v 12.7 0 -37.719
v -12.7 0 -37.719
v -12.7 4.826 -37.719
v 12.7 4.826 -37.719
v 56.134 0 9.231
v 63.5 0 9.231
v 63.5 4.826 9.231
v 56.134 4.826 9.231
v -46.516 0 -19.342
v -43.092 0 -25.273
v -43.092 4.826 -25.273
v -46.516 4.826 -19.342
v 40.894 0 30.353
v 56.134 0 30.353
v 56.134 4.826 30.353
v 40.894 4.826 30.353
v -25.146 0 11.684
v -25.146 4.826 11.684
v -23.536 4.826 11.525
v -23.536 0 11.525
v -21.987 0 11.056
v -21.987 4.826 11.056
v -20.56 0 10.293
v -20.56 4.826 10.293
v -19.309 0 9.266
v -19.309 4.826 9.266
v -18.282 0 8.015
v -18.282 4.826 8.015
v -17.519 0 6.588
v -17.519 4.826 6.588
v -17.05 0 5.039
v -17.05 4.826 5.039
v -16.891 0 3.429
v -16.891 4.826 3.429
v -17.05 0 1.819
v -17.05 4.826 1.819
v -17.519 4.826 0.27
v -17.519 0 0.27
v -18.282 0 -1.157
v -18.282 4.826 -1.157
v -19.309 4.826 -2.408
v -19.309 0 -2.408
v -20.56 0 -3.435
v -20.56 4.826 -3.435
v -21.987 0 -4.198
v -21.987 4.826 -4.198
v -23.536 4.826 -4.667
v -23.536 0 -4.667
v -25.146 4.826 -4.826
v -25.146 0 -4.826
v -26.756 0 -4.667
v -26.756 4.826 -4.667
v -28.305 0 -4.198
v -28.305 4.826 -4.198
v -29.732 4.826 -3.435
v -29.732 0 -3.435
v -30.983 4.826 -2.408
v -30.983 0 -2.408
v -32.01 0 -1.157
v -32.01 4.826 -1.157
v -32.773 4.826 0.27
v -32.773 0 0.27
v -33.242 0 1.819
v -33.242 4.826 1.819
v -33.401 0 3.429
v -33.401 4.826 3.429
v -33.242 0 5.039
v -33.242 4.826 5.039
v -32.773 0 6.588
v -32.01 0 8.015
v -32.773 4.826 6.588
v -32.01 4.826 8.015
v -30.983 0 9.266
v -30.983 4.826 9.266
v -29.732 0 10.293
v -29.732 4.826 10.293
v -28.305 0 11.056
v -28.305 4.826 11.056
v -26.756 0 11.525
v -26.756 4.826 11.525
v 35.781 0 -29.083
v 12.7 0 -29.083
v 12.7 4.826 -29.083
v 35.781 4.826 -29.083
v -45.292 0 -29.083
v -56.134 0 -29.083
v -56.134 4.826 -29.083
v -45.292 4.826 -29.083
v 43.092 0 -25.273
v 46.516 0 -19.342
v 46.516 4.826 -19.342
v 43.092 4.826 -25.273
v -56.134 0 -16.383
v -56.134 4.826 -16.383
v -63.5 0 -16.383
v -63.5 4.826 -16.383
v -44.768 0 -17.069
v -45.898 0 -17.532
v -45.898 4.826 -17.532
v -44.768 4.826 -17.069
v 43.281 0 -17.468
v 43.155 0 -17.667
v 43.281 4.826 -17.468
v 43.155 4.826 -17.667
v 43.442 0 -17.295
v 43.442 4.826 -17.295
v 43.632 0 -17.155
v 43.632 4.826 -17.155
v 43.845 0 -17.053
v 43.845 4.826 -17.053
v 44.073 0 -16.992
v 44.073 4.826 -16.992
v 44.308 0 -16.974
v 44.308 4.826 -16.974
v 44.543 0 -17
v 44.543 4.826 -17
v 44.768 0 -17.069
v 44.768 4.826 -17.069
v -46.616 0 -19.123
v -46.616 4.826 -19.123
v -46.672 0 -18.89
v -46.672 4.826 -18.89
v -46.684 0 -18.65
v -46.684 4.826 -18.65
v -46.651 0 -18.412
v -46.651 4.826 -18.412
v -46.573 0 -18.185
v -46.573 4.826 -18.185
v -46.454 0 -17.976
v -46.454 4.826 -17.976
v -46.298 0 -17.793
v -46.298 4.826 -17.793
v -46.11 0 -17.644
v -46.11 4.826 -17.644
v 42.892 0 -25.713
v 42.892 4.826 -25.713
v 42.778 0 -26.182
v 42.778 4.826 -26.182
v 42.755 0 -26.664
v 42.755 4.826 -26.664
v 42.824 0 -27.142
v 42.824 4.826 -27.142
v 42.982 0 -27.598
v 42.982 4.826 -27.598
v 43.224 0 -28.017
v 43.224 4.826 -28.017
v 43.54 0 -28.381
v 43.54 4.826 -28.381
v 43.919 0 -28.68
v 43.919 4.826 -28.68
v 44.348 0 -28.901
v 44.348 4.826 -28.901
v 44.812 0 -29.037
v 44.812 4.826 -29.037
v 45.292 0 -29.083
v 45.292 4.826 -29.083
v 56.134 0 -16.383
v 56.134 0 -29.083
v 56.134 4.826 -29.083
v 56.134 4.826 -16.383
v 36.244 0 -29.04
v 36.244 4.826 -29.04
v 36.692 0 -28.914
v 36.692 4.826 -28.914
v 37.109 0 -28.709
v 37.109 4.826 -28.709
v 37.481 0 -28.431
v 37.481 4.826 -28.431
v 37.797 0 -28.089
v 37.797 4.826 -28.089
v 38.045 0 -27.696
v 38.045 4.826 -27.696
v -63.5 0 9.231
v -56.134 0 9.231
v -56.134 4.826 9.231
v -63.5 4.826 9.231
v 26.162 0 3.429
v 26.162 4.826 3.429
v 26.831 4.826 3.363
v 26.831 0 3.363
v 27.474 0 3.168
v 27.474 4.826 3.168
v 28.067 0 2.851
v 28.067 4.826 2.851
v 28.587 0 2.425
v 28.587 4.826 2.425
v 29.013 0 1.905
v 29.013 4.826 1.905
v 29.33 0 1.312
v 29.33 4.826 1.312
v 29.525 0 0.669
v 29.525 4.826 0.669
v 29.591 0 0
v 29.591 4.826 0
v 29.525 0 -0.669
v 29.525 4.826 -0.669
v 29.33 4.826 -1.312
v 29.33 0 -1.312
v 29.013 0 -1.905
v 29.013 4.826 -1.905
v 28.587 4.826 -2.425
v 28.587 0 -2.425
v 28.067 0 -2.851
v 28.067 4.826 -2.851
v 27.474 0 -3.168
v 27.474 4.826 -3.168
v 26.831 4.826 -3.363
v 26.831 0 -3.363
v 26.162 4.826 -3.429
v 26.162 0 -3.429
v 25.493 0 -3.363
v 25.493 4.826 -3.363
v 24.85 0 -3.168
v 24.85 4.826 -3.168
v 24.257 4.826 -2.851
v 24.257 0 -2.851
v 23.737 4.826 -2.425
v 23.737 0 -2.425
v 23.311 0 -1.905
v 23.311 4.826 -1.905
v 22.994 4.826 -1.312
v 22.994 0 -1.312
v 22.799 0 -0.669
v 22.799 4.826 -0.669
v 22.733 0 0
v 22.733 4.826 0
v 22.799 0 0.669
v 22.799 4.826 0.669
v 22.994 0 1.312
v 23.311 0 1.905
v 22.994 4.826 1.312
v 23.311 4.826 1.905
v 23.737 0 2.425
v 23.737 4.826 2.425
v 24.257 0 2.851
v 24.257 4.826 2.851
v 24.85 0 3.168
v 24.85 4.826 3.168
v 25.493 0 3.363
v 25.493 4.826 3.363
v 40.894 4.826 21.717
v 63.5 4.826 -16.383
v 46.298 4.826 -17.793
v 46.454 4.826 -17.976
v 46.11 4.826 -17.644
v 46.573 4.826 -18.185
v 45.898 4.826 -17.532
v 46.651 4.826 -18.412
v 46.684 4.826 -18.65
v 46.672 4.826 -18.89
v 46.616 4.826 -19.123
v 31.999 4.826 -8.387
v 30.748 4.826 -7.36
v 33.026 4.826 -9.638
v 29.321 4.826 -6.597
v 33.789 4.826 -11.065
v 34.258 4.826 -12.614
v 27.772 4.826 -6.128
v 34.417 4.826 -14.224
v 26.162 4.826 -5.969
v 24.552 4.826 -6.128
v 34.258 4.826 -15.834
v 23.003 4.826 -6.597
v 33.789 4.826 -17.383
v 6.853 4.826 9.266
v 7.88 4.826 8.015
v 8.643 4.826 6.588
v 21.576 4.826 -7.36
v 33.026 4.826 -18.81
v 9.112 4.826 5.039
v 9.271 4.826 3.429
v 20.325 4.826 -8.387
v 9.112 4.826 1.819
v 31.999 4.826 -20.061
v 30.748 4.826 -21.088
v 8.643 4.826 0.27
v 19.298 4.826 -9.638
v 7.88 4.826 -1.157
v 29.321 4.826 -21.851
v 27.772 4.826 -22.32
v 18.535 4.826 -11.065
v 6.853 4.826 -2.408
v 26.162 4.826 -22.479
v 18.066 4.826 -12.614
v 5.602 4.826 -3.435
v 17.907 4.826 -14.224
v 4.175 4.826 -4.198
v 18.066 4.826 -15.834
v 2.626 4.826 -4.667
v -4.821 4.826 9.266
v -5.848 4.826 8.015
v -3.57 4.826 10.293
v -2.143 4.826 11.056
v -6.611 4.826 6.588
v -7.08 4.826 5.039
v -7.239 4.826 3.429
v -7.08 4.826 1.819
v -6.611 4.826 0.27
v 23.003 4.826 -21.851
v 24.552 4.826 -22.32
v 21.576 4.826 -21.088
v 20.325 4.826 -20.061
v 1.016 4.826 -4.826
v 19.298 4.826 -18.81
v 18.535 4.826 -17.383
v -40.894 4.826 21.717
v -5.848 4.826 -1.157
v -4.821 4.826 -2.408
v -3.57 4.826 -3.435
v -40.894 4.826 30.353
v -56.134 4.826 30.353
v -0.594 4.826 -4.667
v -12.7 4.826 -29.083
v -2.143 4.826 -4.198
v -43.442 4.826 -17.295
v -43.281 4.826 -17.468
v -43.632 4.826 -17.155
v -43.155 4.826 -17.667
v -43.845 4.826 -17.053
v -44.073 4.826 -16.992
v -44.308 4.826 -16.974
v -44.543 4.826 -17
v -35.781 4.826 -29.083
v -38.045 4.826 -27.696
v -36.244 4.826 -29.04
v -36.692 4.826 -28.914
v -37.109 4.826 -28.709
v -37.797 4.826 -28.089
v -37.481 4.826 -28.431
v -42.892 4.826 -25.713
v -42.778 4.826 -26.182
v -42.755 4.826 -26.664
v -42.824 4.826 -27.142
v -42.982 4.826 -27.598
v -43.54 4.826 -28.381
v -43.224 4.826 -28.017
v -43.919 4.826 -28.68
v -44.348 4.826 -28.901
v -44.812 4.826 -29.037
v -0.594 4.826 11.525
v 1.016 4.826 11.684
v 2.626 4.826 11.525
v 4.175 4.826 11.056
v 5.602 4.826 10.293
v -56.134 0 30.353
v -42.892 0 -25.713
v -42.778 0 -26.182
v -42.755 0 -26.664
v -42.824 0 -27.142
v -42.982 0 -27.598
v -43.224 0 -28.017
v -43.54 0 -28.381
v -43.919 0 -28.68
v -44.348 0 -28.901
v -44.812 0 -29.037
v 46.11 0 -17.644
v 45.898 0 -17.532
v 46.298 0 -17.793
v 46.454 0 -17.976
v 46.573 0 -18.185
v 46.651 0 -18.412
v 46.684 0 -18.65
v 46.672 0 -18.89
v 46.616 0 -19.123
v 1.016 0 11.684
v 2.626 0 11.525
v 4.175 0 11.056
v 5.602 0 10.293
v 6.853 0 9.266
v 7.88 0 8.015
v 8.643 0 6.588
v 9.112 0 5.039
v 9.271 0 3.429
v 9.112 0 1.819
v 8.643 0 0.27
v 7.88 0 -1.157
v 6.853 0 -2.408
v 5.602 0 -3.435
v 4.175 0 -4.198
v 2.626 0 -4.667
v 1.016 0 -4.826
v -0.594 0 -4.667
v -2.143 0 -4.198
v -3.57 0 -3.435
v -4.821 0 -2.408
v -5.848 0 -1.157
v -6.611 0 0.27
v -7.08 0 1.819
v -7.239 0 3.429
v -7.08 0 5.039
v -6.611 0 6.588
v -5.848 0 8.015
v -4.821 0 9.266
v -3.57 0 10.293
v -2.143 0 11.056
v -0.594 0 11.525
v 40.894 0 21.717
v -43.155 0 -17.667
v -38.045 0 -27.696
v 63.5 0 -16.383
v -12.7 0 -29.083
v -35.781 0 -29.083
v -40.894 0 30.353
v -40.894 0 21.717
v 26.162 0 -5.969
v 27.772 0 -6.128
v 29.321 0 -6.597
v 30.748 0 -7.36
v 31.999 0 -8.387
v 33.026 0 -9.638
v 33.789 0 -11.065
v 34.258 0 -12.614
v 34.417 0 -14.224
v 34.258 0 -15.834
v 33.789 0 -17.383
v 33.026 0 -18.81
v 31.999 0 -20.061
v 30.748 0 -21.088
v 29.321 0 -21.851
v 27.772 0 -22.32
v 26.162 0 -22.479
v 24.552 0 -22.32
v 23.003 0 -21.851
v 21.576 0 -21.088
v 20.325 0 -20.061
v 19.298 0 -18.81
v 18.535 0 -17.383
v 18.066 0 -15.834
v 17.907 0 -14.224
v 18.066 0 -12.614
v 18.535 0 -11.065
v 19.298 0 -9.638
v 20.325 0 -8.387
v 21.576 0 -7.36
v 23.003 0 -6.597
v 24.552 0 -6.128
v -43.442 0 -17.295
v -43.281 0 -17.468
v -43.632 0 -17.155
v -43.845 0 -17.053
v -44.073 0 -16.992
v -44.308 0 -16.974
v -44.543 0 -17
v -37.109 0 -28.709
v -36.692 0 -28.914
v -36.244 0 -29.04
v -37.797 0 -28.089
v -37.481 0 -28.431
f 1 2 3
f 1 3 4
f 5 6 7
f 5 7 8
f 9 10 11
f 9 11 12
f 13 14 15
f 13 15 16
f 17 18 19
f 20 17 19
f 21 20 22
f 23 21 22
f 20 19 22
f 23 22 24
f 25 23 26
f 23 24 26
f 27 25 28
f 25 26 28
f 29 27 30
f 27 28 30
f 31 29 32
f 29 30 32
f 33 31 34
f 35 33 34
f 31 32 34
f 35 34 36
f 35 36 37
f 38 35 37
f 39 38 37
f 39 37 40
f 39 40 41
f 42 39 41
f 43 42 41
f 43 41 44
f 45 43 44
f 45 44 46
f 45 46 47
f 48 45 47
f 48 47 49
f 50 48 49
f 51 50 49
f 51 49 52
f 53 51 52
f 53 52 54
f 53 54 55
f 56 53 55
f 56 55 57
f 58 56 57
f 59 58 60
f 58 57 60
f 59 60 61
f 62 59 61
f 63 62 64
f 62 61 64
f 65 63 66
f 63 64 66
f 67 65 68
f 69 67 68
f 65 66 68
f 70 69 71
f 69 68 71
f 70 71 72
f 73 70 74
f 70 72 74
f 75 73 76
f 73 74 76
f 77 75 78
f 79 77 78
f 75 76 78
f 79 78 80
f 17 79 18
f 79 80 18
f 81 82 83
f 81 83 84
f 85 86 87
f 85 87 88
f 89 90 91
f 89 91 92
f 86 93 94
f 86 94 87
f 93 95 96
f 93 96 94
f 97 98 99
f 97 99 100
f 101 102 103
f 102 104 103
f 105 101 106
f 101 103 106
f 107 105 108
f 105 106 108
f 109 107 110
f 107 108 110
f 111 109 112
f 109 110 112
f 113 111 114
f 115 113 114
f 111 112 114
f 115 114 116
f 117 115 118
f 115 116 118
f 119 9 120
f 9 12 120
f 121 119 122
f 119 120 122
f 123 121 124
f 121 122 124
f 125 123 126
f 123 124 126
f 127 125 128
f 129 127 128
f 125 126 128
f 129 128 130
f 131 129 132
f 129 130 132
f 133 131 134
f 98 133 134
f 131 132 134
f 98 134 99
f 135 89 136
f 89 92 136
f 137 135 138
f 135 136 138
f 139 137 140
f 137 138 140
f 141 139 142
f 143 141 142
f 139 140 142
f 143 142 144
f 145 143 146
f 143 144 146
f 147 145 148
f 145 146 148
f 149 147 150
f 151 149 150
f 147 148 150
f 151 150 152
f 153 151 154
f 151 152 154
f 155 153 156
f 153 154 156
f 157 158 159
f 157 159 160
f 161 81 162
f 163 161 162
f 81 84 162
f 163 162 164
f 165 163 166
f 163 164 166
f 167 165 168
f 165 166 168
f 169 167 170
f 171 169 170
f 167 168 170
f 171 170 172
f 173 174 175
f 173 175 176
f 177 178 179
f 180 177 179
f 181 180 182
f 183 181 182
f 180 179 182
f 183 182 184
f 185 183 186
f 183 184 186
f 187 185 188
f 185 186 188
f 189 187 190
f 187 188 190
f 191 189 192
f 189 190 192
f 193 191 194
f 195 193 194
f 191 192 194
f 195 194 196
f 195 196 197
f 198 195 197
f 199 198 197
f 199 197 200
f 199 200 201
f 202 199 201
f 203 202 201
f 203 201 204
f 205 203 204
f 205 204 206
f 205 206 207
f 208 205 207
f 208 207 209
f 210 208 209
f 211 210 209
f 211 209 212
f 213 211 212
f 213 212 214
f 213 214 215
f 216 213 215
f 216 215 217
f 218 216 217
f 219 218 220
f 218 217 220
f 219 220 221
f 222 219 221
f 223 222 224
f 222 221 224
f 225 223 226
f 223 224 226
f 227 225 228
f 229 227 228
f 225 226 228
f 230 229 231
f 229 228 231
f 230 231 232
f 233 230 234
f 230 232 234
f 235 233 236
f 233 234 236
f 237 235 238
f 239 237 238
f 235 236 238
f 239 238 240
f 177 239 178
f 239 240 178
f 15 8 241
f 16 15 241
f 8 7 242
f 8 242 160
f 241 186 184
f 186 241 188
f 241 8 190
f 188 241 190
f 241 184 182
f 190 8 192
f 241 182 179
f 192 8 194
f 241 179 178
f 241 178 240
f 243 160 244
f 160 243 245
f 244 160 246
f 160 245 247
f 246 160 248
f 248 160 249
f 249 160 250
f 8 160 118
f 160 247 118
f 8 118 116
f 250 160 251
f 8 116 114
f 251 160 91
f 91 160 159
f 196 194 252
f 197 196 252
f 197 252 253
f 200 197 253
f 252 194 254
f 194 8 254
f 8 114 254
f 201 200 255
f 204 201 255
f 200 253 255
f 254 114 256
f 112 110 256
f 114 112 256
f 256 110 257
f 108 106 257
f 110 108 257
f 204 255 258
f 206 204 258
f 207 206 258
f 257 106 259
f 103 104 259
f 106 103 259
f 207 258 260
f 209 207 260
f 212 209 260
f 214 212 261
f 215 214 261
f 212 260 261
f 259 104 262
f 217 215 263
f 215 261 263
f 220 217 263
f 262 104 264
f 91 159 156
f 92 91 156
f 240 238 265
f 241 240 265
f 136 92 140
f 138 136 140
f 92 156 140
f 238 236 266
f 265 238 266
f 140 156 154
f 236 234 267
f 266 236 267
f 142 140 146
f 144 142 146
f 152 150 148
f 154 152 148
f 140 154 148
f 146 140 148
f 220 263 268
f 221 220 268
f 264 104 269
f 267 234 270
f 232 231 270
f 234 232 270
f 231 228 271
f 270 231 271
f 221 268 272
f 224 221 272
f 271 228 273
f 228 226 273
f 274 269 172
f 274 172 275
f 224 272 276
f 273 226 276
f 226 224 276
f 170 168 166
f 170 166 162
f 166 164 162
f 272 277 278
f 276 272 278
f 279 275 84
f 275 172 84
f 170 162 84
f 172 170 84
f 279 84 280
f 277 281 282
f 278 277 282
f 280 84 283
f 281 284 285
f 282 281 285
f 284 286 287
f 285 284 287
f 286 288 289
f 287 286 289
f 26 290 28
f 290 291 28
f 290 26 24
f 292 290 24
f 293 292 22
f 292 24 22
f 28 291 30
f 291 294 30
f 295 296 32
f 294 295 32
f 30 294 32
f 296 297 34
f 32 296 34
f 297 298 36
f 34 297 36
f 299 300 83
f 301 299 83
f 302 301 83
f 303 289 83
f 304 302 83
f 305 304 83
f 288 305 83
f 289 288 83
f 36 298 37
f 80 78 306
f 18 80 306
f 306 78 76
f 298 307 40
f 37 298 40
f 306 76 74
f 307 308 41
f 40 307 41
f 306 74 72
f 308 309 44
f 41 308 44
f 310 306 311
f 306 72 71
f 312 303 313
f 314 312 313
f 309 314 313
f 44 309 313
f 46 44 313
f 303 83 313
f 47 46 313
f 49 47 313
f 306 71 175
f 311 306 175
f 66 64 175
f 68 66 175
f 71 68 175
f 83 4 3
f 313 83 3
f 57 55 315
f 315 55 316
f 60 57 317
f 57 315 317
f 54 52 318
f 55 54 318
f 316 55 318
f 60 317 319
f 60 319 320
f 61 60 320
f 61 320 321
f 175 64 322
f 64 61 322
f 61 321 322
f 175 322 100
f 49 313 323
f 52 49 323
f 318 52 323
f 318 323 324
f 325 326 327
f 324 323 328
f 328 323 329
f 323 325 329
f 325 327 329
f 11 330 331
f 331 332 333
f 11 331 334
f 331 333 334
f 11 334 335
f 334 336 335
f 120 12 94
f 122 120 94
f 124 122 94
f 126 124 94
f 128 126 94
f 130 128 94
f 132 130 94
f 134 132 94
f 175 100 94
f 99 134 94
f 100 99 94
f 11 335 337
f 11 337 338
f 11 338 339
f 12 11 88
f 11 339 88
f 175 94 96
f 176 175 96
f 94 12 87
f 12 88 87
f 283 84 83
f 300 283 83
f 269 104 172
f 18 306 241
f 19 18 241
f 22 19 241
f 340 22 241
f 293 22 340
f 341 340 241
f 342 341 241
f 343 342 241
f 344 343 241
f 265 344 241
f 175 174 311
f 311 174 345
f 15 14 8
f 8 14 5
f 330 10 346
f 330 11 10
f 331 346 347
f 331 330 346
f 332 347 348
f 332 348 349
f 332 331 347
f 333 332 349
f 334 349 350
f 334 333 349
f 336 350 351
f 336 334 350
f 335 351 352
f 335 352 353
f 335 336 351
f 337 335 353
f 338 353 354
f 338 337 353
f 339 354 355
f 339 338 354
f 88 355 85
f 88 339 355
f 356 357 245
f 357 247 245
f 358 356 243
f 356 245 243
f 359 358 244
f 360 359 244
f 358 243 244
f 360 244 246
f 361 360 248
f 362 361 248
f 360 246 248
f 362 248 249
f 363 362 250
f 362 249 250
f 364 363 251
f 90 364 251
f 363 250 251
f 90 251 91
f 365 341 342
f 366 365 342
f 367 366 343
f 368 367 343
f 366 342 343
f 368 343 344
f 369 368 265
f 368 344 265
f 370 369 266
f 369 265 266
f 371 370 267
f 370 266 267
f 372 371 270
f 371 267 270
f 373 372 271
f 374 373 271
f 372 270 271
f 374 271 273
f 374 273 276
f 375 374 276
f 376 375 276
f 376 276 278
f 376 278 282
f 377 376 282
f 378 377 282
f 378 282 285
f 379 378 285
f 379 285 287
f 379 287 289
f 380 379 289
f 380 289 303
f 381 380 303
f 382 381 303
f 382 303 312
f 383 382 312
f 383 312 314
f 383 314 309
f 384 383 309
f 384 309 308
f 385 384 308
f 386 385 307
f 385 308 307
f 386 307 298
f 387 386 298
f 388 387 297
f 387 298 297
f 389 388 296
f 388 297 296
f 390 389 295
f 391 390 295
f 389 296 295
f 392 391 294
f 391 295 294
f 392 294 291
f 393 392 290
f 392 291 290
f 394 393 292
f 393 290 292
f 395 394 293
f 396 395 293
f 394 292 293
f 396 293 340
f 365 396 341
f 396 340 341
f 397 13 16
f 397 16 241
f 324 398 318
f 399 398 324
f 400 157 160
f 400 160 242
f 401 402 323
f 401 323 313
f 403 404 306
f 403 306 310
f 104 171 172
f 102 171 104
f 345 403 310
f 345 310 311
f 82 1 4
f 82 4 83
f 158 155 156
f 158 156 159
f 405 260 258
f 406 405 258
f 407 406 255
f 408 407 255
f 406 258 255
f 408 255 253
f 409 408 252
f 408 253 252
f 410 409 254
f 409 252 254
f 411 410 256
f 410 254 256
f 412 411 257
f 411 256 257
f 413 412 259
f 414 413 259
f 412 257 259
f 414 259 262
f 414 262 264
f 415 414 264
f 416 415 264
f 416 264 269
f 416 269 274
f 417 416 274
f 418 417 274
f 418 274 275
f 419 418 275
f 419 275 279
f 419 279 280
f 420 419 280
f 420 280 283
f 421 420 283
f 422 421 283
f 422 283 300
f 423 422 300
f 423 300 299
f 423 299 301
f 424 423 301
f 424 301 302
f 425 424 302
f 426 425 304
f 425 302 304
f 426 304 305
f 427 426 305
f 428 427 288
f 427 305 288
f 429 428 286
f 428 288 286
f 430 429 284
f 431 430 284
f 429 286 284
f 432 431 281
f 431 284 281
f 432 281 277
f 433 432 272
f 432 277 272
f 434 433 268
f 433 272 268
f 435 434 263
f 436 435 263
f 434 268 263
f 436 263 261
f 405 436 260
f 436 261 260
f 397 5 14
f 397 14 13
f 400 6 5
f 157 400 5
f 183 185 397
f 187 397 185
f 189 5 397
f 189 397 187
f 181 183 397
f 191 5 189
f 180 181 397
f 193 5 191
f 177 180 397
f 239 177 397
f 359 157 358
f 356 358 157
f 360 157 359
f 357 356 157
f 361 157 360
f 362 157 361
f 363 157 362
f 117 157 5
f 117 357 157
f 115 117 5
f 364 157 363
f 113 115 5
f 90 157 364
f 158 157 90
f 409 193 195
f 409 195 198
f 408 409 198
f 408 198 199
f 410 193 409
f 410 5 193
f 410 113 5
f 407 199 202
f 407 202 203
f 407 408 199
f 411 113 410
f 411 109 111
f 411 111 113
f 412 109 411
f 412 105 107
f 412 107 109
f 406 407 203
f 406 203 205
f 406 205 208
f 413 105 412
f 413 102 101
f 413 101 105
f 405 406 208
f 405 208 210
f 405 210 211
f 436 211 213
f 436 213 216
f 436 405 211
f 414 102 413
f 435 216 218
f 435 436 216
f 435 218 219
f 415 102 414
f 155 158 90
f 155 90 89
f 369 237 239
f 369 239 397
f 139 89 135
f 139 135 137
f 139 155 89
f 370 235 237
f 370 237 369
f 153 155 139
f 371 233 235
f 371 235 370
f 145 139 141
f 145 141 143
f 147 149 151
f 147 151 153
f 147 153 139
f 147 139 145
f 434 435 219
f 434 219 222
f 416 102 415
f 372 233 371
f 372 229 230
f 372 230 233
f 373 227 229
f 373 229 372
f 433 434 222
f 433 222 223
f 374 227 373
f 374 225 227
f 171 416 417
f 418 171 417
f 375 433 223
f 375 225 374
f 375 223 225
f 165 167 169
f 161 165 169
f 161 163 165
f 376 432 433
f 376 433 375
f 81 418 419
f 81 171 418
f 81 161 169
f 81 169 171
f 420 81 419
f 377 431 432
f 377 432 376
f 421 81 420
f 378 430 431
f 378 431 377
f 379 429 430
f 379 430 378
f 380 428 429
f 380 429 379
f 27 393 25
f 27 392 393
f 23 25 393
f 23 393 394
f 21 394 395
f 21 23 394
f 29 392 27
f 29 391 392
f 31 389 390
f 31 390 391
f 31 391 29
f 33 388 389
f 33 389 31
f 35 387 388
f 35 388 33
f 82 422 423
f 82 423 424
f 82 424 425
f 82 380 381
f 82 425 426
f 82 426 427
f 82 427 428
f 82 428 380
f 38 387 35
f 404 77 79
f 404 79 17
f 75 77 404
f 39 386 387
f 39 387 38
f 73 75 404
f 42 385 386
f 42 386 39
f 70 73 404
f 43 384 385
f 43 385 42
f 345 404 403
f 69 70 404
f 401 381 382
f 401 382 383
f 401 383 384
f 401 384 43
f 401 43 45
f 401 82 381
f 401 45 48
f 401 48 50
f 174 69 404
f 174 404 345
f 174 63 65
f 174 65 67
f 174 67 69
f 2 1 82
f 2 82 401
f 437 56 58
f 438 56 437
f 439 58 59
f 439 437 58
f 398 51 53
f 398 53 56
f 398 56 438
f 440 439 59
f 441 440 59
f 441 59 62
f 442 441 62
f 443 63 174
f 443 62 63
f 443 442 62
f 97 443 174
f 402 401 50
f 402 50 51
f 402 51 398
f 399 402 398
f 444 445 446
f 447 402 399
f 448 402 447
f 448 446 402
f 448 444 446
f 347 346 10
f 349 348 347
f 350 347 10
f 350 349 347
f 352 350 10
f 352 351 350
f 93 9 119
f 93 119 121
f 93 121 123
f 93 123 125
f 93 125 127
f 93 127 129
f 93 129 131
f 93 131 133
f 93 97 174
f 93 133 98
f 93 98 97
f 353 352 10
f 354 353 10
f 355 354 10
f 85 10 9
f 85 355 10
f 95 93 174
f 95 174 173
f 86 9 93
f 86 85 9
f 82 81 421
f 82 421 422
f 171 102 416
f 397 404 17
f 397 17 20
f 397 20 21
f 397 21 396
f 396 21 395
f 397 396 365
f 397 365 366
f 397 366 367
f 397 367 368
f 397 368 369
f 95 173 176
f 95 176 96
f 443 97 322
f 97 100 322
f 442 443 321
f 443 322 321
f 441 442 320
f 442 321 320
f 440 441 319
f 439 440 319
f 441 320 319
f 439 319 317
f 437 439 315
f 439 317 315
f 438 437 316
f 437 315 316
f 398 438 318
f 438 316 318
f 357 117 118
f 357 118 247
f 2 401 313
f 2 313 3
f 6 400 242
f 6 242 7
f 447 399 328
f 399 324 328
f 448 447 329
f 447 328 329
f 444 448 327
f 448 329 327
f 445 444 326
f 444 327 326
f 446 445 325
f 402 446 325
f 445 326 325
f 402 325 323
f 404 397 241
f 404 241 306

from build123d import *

# Parameters (mm, degrees)
BOSS_EXTRUDE1_DEPTH = 4.826
FILLET1_R           = 1.27
SKETCH2_R           = 8.255
SKETCH2_R_2         = 3.429
CUT_EXTRUDE1_DEPTH  = 75.015290562
FILLET2_R           = 2.54


with BuildPart() as part:
    # Sketch1 → Boss-Extrude1 (new body)
    with BuildSketch(Plane(origin=(0, 0, 0), x_dir=(1, 0, 0), z_dir=(0, 1, 0))):
        Polygon((-56.134, 29.083), (-40.894, 29.083), (-47.241885042, 18.083256572), (-43.685885042, 16.624574128), (-37.338, 29.083), (-12.7, 29.083), (-12.7, 37.719), (12.7, 37.719), (12.7, 29.083), (37.338, 29.083), (43.685885042, 16.624574128), (47.241885042, 18.083256572), (40.894, 29.083), (56.134, 29.083), (56.134, 16.383), (63.5, 16.383), (63.5, -9.230617291), (56.134, -9.230617291), (56.134, -29.083), (56.134, -30.353), (40.894, -30.353), (40.894, -21.717), (-40.894, -21.717), (-40.894, -30.353), (-56.134, -30.353), (-56.134, -29.083), (-56.134, -9.230617291), (-63.5, -9.230617291), (-63.5, 16.383), (-56.134, 16.383), align=None)
    extrude(amount=BOSS_EXTRUDE1_DEPTH)

    # Fillet1
    fillet1_edges = [part.edges().sort_by_distance(p)[0] for p in [
        (-47.241885042, 2.413, -18.083256572),
        (-43.685885042, 2.413, -16.624574128),
        (43.685885042, 2.413, -16.624574128),
        (47.241885042, 2.413, -18.083256572),
    ]]
    fillet(fillet1_edges, radius=FILLET1_R)

    # Sketch2 → Cut-Extrude1 (cut, through all)
    with BuildSketch(Plane(origin=(0, 4.826, 0), x_dir=(1, 0, 0), z_dir=(0, 1, 0))):
        with Locations(Location((26.162, 14.224, 0), (0, 0, 270))):
            Circle(SKETCH2_R)
        with Locations(Location((26.162, 0, 0), (0, 0, 270))):
            Circle(SKETCH2_R_2)
        with Locations(Location((-25.146, -3.429, 0), (0, 0, 270))):
            Circle(SKETCH2_R)
        with Locations(Location((1.016, -3.429, 0), (0, 0, 270))):
            Circle(SKETCH2_R)
    extrude(amount=-CUT_EXTRUDE1_DEPTH, mode=Mode.SUBTRACT)

    # Fillet2
    fillet2_edges = [part.edges().sort_by_distance(p)[0] for p in [
        (-40.894, 2.413, -29.083),
        (-37.338, 2.413, -29.083),
        (37.338, 2.413, -29.083),
        (40.894, 2.413, -29.083),
    ]]
    fillet(fillet2_edges, radius=FILLET2_R)


solid = part.part
